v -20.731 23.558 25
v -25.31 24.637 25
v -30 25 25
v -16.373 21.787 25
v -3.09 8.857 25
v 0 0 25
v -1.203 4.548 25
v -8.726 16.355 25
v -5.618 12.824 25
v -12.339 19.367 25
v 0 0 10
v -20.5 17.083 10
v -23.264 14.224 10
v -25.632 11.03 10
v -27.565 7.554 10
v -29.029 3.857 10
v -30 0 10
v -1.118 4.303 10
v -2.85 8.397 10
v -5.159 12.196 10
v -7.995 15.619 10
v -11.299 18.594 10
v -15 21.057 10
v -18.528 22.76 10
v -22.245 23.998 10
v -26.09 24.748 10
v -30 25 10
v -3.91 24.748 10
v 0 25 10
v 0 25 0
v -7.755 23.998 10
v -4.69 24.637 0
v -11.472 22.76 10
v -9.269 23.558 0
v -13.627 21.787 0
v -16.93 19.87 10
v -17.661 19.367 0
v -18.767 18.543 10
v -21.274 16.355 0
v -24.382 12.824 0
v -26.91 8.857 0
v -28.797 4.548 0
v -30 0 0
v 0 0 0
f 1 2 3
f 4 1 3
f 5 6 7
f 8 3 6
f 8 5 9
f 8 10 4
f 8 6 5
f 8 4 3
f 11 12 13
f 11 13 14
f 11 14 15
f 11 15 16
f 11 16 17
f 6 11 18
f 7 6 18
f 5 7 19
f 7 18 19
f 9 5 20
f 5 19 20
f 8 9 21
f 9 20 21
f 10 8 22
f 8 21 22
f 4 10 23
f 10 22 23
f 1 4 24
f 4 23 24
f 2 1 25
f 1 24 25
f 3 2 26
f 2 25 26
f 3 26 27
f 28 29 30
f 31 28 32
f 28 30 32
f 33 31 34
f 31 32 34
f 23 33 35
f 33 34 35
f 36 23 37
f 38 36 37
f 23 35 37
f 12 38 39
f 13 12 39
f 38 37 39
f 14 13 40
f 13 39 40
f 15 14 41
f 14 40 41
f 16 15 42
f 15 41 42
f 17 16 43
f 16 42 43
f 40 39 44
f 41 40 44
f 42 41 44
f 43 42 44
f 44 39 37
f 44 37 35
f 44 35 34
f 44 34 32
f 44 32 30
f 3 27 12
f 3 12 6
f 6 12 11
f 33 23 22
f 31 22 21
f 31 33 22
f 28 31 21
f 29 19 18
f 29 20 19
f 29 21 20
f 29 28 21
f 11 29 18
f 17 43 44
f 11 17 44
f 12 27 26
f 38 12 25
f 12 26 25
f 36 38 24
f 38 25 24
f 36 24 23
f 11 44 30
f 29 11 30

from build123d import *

# Parameters (mm, degrees)
BOSS_EXTRUDE1_DEPTH = 10
BOSS_EXTRUDE2_DEPTH = 15


with BuildPart() as part:
    # Sketch1 → Boss-Extrude1 (new body)
    with BuildSketch(Plane.XY):
        with BuildLine():
            Line((-30, 0), (0, 0))
            Line((0, 0), (0, 25))
            ThreePointArc((0, 25), (-19.52562419, 17.930749028), (-30, 0))
        make_face()
    extrude(amount=BOSS_EXTRUDE1_DEPTH)

    # Sketch2 → Boss-Extrude2 (add)
    with BuildSketch(Plane.XY.offset(10)):
        with BuildLine():
            Line((-30, 25), (0, 0))
            ThreePointArc((0, 0), (-10.47437581, 17.930749028), (-30, 25))
        make_face()
    extrude(amount=BOSS_EXTRUDE2_DEPTH)


solid = part.part
